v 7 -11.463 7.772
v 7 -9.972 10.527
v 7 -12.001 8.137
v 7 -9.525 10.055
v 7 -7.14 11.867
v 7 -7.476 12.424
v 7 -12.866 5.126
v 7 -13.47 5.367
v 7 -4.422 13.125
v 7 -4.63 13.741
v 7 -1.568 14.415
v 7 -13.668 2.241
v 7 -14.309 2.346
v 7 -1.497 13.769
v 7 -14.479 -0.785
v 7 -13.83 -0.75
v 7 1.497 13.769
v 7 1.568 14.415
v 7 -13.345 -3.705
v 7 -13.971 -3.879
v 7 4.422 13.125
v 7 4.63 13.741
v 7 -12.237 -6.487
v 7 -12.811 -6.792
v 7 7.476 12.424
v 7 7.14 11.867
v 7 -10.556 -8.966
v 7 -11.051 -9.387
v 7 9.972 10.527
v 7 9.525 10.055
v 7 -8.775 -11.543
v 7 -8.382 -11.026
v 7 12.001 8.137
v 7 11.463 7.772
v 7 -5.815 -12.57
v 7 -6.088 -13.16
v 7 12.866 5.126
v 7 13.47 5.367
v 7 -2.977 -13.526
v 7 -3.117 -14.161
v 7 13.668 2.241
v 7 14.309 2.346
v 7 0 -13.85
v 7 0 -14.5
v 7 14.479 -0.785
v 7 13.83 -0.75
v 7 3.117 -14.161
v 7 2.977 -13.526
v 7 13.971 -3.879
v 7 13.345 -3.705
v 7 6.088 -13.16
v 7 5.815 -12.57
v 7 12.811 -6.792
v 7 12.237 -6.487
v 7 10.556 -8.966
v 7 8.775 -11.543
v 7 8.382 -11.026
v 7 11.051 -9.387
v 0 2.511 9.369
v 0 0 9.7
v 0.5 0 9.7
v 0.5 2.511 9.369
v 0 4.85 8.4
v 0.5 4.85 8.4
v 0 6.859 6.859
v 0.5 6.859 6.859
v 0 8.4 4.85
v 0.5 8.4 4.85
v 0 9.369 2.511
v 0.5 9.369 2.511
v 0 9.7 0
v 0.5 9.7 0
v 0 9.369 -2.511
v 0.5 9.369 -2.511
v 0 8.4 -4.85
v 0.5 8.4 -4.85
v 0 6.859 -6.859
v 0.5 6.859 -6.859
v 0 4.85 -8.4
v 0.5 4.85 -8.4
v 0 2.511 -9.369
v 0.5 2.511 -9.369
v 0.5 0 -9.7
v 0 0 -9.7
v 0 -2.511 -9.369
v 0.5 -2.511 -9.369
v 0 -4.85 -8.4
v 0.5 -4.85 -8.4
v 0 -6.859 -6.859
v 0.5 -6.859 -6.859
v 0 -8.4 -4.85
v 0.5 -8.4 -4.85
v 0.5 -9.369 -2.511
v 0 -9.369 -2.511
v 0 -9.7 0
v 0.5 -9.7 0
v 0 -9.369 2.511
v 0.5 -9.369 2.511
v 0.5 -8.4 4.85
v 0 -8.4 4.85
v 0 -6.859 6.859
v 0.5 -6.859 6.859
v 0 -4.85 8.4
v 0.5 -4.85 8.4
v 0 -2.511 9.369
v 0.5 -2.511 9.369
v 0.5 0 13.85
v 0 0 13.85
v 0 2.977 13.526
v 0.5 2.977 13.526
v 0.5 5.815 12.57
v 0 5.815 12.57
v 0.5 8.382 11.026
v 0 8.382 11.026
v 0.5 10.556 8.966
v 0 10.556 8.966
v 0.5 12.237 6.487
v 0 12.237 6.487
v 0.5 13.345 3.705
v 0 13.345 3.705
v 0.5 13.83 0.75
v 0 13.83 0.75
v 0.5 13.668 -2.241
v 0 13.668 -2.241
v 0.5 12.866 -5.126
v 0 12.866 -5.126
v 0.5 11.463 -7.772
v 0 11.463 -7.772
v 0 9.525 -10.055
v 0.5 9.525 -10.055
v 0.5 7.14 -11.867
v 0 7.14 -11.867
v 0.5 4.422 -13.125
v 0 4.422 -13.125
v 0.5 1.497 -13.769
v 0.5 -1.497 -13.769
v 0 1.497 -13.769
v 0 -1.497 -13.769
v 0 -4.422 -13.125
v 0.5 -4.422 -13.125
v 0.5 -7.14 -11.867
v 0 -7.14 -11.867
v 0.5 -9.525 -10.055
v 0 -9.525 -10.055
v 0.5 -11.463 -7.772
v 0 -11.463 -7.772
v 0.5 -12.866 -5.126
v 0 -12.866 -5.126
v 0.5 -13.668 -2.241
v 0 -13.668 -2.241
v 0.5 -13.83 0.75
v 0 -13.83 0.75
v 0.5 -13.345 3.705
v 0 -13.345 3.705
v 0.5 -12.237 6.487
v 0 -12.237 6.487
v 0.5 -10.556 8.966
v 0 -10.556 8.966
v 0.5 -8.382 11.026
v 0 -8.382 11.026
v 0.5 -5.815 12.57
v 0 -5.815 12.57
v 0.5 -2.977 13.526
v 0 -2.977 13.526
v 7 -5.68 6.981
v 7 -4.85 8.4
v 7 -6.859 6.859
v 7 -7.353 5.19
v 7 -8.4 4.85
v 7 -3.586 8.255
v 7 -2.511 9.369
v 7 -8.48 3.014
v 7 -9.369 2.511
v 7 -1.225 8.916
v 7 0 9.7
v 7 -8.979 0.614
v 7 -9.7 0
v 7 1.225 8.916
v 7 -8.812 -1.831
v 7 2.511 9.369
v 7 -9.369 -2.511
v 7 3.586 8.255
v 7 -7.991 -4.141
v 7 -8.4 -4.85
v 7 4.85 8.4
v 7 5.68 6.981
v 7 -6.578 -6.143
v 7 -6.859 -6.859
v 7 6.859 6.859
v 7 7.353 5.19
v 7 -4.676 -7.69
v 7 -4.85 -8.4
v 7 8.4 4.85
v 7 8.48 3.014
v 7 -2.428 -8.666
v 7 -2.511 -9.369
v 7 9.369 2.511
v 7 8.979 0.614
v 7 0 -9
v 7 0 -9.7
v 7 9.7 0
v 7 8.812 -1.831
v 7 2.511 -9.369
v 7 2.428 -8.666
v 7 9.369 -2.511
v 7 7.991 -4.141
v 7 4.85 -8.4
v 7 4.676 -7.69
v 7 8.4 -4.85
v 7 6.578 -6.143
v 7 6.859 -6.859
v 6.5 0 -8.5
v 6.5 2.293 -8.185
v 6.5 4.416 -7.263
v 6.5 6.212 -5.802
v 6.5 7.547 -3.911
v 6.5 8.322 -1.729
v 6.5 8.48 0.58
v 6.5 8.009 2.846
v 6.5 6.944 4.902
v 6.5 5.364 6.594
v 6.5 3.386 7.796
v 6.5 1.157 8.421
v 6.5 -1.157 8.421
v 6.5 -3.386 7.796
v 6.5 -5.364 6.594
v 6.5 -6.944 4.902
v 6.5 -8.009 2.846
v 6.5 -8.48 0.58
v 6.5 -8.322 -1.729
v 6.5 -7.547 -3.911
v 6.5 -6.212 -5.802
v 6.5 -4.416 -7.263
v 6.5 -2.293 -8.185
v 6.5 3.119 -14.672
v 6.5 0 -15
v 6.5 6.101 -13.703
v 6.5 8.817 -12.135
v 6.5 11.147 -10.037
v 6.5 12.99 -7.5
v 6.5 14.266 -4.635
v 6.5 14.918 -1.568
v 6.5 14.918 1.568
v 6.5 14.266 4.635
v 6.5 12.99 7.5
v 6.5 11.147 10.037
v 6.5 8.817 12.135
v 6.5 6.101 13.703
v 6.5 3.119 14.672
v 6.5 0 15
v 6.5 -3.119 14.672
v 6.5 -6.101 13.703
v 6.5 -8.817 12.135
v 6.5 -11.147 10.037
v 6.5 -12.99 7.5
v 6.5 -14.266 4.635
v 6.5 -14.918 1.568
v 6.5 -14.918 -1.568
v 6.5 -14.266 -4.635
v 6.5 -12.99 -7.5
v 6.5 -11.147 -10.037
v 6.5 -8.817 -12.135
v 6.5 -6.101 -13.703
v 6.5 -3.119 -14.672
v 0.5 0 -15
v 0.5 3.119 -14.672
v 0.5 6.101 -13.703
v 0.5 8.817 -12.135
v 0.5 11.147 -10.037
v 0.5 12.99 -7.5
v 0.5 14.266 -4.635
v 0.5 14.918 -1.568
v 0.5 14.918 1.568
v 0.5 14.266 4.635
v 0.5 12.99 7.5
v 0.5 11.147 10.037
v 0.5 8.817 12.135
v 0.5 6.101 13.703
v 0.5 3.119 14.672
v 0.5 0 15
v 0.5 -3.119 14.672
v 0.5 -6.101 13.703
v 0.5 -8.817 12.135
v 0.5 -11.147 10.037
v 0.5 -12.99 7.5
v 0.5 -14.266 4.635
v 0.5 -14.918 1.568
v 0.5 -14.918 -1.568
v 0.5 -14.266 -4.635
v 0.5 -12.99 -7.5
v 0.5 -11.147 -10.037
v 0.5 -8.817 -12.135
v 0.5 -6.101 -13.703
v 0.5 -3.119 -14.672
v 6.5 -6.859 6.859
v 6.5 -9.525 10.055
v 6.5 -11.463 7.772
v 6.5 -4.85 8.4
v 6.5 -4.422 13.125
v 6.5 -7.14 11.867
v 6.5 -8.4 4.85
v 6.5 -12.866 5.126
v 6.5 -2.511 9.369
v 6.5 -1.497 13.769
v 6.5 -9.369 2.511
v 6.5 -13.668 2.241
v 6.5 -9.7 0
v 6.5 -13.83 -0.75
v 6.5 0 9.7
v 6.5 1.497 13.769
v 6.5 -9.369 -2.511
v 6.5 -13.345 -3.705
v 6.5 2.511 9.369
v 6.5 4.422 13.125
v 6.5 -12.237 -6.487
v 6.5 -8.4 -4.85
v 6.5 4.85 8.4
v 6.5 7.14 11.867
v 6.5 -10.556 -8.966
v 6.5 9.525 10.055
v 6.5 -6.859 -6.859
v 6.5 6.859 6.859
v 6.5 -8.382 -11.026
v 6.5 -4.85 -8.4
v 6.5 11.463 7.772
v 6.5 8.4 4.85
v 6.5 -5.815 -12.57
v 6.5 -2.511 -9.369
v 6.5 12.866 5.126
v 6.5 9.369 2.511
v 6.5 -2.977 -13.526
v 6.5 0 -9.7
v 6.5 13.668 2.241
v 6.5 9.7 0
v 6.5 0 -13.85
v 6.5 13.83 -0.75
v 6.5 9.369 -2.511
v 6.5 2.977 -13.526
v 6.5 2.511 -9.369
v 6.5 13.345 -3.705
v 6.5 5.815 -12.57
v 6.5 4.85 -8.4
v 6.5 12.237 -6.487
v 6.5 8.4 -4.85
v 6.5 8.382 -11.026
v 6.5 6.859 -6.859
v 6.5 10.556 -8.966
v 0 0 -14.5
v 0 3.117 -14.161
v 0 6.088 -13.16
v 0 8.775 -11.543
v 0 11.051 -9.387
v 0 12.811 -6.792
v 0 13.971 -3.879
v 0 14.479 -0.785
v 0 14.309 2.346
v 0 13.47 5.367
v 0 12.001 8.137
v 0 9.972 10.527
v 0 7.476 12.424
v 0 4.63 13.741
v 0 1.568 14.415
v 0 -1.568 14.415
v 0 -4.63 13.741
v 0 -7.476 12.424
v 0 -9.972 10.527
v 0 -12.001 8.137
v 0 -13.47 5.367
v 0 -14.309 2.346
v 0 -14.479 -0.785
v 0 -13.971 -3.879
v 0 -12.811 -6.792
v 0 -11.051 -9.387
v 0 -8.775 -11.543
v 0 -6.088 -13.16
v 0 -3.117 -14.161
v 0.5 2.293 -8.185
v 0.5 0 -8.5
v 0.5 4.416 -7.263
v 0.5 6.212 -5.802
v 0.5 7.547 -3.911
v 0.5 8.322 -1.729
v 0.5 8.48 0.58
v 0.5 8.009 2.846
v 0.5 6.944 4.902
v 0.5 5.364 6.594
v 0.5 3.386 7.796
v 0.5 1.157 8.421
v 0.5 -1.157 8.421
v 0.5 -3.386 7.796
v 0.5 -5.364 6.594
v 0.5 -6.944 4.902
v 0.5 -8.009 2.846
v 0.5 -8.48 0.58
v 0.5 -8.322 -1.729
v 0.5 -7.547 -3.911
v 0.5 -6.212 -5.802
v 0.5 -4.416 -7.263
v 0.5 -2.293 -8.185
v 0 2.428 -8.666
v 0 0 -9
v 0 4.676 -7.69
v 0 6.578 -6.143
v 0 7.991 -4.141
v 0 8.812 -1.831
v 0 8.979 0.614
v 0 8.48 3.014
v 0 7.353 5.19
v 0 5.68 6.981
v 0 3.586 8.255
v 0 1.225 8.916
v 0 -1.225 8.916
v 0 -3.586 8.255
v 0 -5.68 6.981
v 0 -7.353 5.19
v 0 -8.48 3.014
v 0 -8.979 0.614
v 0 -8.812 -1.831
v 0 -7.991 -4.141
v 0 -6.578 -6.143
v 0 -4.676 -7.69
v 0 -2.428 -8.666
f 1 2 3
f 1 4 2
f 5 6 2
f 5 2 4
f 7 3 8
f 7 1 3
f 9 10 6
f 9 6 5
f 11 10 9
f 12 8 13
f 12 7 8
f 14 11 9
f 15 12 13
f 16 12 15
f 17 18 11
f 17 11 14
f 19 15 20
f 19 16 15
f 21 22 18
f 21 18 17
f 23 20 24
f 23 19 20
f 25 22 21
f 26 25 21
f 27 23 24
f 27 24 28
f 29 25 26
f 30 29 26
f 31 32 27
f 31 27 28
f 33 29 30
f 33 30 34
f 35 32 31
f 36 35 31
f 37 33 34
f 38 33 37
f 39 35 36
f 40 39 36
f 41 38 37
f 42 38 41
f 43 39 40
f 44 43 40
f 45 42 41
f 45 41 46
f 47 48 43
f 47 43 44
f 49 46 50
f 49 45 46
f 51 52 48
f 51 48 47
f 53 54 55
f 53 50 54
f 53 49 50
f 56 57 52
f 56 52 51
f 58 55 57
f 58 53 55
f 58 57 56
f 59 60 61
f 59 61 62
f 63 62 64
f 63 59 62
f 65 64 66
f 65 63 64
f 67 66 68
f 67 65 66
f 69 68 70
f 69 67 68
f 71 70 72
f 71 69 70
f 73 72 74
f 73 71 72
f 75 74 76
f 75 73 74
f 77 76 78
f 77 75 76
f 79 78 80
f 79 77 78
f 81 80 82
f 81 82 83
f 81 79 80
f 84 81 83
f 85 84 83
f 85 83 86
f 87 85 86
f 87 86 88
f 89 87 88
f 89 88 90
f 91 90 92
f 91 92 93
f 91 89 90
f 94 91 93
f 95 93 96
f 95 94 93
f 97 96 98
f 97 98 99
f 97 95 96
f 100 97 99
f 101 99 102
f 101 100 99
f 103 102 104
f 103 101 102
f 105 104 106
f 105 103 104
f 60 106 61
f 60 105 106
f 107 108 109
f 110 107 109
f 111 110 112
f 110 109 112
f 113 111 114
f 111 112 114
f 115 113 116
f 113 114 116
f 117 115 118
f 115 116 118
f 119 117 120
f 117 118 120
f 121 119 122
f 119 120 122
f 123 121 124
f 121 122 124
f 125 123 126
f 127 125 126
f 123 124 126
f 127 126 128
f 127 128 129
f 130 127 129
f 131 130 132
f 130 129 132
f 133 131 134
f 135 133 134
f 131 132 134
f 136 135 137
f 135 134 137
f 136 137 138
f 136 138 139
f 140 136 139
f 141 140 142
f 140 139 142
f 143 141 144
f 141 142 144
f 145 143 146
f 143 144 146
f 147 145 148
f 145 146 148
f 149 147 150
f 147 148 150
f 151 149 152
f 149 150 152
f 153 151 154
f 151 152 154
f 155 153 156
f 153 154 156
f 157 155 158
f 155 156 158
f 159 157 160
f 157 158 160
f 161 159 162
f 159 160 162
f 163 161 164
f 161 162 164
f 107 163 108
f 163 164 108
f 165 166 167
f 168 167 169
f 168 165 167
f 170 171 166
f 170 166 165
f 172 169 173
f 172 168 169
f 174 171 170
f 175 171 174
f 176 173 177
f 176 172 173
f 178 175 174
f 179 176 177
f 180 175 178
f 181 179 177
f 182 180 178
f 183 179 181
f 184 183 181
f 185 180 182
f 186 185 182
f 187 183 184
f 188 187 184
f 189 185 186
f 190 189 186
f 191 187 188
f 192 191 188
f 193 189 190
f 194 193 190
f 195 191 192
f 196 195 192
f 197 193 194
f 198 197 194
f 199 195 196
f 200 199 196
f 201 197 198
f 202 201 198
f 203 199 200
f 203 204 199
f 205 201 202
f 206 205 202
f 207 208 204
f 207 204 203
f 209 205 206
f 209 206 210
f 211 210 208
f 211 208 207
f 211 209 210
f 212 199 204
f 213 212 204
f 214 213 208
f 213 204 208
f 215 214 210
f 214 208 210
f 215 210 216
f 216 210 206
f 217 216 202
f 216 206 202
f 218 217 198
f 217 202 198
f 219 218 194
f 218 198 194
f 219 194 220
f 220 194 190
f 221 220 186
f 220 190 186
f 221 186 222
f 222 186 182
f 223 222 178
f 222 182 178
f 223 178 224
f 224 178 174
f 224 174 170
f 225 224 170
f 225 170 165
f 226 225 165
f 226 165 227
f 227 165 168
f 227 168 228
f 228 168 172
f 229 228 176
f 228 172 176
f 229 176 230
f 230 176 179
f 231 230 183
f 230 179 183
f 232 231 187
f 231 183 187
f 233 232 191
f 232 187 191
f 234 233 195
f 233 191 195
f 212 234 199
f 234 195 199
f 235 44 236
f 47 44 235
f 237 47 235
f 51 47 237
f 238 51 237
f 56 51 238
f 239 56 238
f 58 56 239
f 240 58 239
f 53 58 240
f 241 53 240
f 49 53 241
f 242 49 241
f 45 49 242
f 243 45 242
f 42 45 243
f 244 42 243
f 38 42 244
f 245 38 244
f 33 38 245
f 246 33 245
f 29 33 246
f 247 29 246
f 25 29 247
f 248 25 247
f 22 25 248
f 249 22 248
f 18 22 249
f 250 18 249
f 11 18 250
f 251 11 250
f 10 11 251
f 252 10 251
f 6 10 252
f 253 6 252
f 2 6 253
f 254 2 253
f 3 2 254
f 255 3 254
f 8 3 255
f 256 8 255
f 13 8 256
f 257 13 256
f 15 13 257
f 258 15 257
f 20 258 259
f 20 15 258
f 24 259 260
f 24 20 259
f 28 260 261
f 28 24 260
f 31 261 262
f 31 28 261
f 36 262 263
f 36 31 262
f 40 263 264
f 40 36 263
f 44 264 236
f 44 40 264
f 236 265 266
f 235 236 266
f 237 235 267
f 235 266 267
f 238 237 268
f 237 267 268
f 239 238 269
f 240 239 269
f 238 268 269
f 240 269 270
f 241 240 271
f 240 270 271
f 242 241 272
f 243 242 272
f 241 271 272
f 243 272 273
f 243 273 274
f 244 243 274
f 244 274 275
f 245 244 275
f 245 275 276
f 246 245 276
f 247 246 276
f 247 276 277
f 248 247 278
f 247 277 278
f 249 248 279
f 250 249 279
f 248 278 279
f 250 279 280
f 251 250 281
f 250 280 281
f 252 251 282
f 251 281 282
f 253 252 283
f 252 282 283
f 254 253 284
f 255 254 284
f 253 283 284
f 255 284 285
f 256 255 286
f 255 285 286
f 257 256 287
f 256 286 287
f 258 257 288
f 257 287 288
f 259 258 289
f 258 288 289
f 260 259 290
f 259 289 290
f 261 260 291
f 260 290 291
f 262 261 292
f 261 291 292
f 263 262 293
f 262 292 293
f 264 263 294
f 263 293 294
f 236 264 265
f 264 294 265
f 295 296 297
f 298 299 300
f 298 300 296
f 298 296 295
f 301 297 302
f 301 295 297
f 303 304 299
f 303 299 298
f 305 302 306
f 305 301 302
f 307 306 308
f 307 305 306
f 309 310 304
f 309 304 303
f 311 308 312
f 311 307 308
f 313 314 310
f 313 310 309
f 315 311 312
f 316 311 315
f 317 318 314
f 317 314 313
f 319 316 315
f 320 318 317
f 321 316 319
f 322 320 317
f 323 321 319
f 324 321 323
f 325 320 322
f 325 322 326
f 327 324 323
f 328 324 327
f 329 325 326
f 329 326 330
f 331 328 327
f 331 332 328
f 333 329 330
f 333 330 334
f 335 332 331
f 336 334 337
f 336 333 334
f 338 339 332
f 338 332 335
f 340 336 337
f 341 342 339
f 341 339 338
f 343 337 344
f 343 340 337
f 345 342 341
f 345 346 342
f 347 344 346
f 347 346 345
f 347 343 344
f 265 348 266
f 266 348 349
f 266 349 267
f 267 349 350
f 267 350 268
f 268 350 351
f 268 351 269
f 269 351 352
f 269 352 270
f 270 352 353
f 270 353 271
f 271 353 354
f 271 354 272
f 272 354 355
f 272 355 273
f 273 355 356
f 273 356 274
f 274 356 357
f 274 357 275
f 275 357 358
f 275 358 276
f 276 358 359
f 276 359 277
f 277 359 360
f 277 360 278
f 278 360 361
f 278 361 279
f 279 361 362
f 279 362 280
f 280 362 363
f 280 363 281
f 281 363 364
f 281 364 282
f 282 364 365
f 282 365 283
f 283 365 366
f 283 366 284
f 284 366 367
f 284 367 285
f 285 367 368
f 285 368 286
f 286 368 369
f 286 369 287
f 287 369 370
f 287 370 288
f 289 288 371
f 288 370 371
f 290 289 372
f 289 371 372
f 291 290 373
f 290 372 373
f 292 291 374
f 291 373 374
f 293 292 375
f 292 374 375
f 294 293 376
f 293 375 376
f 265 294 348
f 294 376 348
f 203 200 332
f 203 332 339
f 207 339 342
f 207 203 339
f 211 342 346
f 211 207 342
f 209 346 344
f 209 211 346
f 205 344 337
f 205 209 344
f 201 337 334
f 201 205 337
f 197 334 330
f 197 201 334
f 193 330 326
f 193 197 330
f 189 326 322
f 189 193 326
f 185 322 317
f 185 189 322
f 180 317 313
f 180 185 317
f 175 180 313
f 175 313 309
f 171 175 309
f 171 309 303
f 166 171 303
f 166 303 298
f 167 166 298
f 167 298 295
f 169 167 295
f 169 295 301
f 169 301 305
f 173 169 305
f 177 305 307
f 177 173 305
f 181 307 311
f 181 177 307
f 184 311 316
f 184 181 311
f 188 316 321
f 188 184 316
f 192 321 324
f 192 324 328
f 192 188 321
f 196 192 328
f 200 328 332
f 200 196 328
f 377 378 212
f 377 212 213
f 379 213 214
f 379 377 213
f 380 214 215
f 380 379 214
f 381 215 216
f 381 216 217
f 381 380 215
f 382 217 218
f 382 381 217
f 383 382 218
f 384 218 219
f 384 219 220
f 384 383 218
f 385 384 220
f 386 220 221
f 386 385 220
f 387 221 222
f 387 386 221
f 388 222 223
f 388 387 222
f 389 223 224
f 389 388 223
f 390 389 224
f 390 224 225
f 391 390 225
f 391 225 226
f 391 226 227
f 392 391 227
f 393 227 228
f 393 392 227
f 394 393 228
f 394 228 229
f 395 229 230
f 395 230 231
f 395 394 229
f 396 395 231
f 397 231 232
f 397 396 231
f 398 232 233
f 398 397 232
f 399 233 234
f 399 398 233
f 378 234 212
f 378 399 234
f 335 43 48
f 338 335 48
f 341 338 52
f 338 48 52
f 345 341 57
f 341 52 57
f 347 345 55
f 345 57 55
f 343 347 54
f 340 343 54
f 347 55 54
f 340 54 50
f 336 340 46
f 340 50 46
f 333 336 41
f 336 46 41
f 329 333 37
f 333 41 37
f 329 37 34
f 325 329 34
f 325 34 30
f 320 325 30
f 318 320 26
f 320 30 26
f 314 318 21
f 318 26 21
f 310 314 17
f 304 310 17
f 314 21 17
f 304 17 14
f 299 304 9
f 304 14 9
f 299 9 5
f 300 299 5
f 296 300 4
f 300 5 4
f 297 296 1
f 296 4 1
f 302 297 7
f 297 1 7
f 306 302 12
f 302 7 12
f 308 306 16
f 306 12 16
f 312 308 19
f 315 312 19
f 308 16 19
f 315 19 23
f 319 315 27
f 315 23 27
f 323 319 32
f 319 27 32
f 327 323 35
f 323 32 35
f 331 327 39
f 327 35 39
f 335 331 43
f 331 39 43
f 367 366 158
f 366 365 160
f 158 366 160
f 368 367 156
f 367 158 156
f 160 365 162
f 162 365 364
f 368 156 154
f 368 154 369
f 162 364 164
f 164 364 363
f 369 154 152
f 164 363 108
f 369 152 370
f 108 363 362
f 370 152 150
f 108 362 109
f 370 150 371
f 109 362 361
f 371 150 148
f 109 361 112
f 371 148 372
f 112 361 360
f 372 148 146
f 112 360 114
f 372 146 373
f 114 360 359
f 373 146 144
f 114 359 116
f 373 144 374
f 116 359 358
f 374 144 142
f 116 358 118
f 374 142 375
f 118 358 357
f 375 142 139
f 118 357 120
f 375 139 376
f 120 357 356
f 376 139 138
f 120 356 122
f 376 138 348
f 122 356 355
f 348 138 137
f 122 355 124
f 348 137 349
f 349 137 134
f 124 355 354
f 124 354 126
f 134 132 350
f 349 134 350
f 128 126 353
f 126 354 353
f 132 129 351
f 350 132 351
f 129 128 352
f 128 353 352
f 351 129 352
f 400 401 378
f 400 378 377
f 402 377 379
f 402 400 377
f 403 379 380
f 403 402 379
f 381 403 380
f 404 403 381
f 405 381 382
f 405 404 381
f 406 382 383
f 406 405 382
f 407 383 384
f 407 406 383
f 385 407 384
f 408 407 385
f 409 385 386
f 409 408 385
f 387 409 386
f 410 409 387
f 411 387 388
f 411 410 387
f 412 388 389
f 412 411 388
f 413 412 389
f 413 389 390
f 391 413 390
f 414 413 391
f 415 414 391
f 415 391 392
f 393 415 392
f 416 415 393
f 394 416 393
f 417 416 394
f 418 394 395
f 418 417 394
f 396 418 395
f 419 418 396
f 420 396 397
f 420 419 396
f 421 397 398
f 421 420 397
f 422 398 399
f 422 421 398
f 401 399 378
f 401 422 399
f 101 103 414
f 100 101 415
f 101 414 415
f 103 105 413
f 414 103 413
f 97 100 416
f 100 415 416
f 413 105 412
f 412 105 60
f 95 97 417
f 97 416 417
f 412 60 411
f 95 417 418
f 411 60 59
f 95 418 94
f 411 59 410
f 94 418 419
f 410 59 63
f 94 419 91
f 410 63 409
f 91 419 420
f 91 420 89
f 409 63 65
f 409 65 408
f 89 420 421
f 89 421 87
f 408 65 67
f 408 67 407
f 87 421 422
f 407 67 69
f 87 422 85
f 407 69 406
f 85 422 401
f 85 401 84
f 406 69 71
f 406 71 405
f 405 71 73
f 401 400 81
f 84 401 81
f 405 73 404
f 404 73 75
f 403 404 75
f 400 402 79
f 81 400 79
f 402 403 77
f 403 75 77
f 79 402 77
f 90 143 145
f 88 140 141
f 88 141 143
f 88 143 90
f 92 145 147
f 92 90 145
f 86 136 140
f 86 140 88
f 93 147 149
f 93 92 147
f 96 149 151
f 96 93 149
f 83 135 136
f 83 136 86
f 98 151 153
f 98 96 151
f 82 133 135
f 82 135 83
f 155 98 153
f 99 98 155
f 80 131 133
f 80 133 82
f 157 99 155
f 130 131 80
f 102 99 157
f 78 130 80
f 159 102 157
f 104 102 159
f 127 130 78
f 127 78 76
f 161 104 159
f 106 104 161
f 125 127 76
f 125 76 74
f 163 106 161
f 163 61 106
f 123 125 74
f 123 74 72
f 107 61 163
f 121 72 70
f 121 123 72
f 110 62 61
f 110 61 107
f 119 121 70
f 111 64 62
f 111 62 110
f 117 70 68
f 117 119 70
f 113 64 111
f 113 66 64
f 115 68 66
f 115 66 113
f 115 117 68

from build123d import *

# Parameters (mm, degrees)
SKETCH1_R           = 15
SKETCH1_R_2         = 8.5
BOSS_EXTRUDE1_DEPTH = 7
CHAMFER1_SIZE       = 0.5
SKETCH2_R           = 13.85
SKETCH2_R_2         = 9.7
CUT_EXTRUDE1_DEPTH  = 0.5
SKETCH3_R           = 13.85
SKETCH3_R_2         = 9.7
CUT_EXTRUDE2_DEPTH  = 0.5


with BuildPart() as part:
    # Sketch1 → Boss-Extrude1 (new body)
    with BuildSketch(Plane(origin=(0, 0, 0), x_dir=(0, 0, -1), z_dir=(1, 0, 0))):
        Circle(SKETCH1_R)
        Circle(SKETCH1_R_2, mode=Mode.SUBTRACT)
    extrude(amount=BOSS_EXTRUDE1_DEPTH)

    # Chamfer1
    chamfer1_edges = [part.edges().sort_by_distance(p)[0] for p in [
        (0, 0, 15),
        (7, 0, 15),
        (0, 0, 8.5),
        (7, 0, 8.5),
    ]]
    chamfer(chamfer1_edges, length=CHAMFER1_SIZE)

    # Sketch2 → Cut-Extrude1 (cut)
    with BuildSketch(Plane(origin=(7, 0, 0), x_dir=(0, 0, -1), z_dir=(1, 0, 0))):
        Circle(SKETCH2_R)
        Circle(SKETCH2_R_2, mode=Mode.SUBTRACT)
    extrude(amount=-CUT_EXTRUDE1_DEPTH, mode=Mode.SUBTRACT)

    # Sketch3 → Cut-Extrude2 (cut)
    with BuildSketch(Plane.ZY):
        Circle(SKETCH3_R)
        Circle(SKETCH3_R_2, mode=Mode.SUBTRACT)
    extrude(amount=-CUT_EXTRUDE2_DEPTH, mode=Mode.SUBTRACT)


solid = part.part
